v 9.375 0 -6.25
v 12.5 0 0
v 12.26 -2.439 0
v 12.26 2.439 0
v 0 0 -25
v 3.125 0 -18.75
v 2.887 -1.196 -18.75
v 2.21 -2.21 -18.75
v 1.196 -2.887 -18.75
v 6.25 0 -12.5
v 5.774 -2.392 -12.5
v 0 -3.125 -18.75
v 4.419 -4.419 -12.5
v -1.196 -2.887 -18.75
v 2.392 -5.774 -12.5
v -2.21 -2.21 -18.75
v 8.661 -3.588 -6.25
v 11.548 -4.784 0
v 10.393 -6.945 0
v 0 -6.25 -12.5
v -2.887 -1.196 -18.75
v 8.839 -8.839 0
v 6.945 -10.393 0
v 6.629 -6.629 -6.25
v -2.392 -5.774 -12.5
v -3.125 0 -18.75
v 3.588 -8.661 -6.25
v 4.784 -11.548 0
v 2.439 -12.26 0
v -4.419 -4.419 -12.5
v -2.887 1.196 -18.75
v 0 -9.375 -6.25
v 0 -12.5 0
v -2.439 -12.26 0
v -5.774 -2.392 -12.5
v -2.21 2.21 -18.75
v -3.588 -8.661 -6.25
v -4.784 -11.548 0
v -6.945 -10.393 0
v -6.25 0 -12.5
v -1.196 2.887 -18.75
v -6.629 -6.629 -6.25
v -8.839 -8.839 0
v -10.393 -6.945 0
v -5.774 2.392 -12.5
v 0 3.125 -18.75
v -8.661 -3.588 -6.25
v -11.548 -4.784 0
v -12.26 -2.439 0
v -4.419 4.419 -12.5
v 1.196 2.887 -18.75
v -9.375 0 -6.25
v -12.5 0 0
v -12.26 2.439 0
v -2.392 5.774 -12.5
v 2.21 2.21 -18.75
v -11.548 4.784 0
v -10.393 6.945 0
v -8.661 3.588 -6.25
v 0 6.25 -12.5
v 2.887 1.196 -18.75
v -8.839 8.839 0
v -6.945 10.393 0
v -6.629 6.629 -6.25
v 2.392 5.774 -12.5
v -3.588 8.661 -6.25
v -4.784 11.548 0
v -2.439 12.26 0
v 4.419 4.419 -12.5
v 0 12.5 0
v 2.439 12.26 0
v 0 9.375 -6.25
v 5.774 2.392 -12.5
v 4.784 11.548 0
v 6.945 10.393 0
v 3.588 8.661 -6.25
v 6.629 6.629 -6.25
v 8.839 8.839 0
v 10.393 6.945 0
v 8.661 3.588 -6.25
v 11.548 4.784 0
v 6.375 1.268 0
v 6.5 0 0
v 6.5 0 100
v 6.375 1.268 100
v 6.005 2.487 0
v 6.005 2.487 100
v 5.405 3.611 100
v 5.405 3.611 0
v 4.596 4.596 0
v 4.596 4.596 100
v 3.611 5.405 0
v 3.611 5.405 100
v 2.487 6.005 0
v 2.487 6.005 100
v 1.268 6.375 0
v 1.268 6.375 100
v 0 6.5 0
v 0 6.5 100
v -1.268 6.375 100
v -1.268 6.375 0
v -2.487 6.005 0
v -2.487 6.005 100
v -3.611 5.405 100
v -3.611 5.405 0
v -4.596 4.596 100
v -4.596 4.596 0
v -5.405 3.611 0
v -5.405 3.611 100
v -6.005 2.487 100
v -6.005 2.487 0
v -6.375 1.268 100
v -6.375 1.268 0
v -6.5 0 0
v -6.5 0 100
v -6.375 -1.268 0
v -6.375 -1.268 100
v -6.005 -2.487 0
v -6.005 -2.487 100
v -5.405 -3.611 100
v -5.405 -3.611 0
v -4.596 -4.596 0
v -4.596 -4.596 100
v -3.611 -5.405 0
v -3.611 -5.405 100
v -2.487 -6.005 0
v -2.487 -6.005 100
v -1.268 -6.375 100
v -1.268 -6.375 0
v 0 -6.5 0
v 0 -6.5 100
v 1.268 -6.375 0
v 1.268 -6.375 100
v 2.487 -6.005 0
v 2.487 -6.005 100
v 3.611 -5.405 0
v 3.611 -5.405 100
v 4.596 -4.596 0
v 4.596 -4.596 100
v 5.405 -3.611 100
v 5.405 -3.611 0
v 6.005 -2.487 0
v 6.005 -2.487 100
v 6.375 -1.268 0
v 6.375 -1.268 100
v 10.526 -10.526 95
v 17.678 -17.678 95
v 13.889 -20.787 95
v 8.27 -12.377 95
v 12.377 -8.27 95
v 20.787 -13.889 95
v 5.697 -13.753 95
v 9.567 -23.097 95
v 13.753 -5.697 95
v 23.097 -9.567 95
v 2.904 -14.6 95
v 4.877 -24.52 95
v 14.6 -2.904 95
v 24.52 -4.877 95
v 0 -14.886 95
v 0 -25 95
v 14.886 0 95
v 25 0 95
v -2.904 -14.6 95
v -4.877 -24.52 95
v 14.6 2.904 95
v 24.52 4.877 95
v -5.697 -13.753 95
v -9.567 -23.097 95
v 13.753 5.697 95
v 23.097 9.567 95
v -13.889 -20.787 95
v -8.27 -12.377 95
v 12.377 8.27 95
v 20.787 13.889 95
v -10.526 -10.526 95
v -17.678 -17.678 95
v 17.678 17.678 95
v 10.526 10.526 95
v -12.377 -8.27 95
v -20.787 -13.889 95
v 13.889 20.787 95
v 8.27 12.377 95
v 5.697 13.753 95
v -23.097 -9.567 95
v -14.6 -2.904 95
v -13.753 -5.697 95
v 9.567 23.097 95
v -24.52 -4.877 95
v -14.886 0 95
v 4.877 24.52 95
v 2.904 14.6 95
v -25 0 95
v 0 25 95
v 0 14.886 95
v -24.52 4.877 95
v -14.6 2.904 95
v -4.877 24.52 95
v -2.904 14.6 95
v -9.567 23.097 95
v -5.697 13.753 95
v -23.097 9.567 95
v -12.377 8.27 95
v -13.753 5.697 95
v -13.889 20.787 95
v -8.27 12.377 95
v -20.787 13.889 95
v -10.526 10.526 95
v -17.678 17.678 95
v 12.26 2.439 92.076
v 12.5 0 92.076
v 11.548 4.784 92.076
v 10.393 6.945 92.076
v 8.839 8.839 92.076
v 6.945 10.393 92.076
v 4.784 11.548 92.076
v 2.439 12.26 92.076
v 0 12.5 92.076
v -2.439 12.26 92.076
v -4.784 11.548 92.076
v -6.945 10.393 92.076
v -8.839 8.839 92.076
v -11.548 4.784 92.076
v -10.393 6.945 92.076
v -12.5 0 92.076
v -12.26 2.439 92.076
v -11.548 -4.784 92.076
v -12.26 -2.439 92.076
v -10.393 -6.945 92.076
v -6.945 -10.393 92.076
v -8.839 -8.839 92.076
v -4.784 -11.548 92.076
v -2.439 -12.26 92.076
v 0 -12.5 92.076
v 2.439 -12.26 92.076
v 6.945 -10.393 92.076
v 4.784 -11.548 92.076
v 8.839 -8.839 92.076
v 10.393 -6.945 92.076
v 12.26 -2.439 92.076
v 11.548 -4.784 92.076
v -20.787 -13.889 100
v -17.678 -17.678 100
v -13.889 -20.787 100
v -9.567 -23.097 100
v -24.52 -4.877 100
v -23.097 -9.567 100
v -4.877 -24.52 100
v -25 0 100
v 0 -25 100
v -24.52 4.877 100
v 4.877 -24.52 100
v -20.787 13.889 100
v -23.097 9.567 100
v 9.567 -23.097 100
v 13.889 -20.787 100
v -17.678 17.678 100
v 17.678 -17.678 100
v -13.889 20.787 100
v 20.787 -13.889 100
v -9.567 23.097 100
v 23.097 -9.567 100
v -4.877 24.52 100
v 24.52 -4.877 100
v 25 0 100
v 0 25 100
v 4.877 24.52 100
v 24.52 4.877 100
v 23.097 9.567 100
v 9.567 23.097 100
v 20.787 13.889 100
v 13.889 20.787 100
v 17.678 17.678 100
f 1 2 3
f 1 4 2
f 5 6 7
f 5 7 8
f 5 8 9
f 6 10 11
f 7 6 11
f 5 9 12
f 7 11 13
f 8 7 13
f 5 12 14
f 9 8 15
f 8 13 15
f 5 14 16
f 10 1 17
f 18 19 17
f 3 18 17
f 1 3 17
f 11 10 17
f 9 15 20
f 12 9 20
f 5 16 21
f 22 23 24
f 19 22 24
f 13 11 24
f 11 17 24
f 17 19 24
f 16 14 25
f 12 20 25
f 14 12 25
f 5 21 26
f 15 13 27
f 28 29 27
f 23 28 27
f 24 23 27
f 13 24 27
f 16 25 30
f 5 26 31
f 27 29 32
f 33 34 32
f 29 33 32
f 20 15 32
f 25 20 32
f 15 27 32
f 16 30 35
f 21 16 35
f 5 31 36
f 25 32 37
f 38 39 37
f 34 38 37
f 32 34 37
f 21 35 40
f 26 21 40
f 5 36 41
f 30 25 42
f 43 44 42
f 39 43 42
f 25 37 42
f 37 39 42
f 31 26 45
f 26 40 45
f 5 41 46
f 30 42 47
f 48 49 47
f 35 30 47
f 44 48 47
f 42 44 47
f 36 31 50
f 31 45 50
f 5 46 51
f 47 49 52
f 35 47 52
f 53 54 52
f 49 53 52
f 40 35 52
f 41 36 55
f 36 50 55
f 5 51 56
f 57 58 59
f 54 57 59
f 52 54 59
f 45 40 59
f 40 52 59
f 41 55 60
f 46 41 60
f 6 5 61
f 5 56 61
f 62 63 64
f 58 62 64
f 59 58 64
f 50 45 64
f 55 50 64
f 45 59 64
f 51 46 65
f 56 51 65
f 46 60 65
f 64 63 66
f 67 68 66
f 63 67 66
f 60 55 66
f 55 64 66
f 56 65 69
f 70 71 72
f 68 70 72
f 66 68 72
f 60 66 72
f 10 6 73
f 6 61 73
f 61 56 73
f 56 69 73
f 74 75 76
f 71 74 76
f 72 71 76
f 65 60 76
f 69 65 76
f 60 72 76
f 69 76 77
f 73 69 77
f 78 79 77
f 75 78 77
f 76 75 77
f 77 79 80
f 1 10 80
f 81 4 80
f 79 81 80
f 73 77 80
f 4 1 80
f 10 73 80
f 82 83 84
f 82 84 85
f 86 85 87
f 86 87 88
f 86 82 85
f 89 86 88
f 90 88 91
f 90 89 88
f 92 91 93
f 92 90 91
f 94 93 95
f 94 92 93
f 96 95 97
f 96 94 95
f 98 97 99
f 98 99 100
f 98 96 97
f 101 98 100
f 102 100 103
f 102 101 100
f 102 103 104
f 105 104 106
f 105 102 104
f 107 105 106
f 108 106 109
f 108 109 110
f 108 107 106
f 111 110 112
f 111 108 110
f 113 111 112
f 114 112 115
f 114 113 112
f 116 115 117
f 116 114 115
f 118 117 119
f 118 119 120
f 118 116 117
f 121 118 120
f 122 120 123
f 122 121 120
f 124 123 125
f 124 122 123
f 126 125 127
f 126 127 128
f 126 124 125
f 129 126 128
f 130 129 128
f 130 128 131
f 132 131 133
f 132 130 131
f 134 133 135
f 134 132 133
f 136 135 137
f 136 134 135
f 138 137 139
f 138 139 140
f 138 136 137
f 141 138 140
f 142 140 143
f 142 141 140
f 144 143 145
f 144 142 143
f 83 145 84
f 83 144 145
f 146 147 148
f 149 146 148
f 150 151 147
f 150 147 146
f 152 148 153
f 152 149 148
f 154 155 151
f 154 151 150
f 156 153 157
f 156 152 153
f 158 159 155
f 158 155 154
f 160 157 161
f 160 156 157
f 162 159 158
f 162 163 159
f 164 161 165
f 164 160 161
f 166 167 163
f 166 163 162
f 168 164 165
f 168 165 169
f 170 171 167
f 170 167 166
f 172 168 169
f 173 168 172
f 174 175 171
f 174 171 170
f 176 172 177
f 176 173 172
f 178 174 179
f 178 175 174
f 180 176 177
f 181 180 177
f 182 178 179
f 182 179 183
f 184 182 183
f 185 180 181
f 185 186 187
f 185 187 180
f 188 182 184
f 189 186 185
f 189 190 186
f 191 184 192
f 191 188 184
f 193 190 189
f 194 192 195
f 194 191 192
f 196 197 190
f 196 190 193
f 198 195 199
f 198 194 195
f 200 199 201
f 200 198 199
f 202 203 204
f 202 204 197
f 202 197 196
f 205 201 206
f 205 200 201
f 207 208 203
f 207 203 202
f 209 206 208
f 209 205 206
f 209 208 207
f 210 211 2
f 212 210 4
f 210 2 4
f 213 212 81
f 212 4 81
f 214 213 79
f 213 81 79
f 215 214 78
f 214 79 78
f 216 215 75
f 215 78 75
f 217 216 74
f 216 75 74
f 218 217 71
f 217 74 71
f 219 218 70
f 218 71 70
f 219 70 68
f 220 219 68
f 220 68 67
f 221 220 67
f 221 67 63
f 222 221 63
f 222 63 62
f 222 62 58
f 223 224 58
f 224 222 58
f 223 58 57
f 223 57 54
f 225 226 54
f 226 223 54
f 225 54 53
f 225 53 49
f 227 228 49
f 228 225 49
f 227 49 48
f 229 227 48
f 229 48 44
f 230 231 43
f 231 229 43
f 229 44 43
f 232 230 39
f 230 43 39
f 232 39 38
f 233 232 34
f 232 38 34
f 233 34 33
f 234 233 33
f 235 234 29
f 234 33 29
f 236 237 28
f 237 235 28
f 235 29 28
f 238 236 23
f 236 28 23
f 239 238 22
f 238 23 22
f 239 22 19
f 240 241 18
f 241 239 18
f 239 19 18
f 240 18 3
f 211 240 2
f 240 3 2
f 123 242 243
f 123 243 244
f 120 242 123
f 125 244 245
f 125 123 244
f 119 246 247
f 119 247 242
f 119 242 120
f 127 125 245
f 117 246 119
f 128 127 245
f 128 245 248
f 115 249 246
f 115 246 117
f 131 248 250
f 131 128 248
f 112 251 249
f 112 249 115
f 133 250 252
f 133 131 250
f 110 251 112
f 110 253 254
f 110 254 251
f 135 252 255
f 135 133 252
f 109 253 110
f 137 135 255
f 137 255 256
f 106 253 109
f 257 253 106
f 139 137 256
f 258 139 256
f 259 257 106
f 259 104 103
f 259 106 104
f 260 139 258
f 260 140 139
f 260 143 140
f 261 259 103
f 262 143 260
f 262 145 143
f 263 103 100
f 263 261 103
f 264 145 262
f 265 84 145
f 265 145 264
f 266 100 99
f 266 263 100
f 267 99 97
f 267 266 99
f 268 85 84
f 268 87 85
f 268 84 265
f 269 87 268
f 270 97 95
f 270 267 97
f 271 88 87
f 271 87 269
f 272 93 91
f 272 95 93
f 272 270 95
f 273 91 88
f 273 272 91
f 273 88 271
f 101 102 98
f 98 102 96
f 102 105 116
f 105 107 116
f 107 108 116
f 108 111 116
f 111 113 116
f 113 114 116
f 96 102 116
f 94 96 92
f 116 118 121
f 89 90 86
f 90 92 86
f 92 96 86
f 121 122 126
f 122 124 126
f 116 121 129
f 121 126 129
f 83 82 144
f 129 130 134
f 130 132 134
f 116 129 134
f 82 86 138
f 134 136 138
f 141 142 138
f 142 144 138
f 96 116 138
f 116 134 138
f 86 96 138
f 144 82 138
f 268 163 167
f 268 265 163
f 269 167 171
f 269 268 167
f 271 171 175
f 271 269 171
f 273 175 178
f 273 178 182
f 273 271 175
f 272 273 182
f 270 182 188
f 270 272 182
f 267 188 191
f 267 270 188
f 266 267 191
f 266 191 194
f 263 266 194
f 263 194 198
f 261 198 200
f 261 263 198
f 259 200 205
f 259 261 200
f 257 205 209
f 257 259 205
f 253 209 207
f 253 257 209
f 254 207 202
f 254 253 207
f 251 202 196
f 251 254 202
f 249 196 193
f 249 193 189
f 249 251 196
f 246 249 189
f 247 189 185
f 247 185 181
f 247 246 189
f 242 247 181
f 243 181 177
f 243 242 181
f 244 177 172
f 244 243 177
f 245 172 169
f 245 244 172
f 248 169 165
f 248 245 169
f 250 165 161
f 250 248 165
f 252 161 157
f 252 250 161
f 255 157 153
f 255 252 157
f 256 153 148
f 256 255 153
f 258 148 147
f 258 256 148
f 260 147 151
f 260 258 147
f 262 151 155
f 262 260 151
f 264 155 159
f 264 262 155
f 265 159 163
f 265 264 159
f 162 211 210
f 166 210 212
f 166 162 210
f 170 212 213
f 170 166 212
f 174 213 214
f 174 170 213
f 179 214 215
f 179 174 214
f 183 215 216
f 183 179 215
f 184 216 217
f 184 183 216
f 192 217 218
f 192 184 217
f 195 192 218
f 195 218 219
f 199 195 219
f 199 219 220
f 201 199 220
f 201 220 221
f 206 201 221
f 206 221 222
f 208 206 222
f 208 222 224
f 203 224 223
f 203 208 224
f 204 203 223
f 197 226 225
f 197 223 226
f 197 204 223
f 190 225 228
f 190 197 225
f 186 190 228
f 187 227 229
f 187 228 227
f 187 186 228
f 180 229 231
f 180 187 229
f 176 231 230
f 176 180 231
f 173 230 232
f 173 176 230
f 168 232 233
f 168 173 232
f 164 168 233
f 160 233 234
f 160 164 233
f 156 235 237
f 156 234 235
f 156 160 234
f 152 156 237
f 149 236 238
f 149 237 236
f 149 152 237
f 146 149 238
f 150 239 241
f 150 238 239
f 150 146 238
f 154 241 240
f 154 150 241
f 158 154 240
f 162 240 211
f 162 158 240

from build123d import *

# Parameters (mm, degrees)
F0_R     = 12.5
F0_R_2   = 6.5
F1_DEPTH = 100


with BuildPart() as f1:
    # F0 (on Top) → F1 (new body)
    with BuildSketch(Plane.XY):
        Circle(F0_R)
        Circle(F0_R_2, mode=Mode.SUBTRACT)
    extrude(amount=F1_DEPTH)

    # F2 (on Front) → F3 (revolve)
    with BuildSketch(Plane.XZ):
        Polygon((12.5, 0), (0, 0), (0, -25), align=None)
    revolve(axis=Axis((0, 0, -12.5), (0, 0, -1)))

    # F4 (on Front) → F5 (revolve)
    with BuildSketch(Plane.XZ):
        Polygon((14.8862302303, 95), (10, 95), (10, 89.0116691589), align=None)
        Polygon((25, 100), (10, 100), (10, 95), (14.8862302303, 95), (25, 95), align=None)
    revolve(axis=Axis((0, 0, 50), (0, 0, 1)))


solid = f1.part
